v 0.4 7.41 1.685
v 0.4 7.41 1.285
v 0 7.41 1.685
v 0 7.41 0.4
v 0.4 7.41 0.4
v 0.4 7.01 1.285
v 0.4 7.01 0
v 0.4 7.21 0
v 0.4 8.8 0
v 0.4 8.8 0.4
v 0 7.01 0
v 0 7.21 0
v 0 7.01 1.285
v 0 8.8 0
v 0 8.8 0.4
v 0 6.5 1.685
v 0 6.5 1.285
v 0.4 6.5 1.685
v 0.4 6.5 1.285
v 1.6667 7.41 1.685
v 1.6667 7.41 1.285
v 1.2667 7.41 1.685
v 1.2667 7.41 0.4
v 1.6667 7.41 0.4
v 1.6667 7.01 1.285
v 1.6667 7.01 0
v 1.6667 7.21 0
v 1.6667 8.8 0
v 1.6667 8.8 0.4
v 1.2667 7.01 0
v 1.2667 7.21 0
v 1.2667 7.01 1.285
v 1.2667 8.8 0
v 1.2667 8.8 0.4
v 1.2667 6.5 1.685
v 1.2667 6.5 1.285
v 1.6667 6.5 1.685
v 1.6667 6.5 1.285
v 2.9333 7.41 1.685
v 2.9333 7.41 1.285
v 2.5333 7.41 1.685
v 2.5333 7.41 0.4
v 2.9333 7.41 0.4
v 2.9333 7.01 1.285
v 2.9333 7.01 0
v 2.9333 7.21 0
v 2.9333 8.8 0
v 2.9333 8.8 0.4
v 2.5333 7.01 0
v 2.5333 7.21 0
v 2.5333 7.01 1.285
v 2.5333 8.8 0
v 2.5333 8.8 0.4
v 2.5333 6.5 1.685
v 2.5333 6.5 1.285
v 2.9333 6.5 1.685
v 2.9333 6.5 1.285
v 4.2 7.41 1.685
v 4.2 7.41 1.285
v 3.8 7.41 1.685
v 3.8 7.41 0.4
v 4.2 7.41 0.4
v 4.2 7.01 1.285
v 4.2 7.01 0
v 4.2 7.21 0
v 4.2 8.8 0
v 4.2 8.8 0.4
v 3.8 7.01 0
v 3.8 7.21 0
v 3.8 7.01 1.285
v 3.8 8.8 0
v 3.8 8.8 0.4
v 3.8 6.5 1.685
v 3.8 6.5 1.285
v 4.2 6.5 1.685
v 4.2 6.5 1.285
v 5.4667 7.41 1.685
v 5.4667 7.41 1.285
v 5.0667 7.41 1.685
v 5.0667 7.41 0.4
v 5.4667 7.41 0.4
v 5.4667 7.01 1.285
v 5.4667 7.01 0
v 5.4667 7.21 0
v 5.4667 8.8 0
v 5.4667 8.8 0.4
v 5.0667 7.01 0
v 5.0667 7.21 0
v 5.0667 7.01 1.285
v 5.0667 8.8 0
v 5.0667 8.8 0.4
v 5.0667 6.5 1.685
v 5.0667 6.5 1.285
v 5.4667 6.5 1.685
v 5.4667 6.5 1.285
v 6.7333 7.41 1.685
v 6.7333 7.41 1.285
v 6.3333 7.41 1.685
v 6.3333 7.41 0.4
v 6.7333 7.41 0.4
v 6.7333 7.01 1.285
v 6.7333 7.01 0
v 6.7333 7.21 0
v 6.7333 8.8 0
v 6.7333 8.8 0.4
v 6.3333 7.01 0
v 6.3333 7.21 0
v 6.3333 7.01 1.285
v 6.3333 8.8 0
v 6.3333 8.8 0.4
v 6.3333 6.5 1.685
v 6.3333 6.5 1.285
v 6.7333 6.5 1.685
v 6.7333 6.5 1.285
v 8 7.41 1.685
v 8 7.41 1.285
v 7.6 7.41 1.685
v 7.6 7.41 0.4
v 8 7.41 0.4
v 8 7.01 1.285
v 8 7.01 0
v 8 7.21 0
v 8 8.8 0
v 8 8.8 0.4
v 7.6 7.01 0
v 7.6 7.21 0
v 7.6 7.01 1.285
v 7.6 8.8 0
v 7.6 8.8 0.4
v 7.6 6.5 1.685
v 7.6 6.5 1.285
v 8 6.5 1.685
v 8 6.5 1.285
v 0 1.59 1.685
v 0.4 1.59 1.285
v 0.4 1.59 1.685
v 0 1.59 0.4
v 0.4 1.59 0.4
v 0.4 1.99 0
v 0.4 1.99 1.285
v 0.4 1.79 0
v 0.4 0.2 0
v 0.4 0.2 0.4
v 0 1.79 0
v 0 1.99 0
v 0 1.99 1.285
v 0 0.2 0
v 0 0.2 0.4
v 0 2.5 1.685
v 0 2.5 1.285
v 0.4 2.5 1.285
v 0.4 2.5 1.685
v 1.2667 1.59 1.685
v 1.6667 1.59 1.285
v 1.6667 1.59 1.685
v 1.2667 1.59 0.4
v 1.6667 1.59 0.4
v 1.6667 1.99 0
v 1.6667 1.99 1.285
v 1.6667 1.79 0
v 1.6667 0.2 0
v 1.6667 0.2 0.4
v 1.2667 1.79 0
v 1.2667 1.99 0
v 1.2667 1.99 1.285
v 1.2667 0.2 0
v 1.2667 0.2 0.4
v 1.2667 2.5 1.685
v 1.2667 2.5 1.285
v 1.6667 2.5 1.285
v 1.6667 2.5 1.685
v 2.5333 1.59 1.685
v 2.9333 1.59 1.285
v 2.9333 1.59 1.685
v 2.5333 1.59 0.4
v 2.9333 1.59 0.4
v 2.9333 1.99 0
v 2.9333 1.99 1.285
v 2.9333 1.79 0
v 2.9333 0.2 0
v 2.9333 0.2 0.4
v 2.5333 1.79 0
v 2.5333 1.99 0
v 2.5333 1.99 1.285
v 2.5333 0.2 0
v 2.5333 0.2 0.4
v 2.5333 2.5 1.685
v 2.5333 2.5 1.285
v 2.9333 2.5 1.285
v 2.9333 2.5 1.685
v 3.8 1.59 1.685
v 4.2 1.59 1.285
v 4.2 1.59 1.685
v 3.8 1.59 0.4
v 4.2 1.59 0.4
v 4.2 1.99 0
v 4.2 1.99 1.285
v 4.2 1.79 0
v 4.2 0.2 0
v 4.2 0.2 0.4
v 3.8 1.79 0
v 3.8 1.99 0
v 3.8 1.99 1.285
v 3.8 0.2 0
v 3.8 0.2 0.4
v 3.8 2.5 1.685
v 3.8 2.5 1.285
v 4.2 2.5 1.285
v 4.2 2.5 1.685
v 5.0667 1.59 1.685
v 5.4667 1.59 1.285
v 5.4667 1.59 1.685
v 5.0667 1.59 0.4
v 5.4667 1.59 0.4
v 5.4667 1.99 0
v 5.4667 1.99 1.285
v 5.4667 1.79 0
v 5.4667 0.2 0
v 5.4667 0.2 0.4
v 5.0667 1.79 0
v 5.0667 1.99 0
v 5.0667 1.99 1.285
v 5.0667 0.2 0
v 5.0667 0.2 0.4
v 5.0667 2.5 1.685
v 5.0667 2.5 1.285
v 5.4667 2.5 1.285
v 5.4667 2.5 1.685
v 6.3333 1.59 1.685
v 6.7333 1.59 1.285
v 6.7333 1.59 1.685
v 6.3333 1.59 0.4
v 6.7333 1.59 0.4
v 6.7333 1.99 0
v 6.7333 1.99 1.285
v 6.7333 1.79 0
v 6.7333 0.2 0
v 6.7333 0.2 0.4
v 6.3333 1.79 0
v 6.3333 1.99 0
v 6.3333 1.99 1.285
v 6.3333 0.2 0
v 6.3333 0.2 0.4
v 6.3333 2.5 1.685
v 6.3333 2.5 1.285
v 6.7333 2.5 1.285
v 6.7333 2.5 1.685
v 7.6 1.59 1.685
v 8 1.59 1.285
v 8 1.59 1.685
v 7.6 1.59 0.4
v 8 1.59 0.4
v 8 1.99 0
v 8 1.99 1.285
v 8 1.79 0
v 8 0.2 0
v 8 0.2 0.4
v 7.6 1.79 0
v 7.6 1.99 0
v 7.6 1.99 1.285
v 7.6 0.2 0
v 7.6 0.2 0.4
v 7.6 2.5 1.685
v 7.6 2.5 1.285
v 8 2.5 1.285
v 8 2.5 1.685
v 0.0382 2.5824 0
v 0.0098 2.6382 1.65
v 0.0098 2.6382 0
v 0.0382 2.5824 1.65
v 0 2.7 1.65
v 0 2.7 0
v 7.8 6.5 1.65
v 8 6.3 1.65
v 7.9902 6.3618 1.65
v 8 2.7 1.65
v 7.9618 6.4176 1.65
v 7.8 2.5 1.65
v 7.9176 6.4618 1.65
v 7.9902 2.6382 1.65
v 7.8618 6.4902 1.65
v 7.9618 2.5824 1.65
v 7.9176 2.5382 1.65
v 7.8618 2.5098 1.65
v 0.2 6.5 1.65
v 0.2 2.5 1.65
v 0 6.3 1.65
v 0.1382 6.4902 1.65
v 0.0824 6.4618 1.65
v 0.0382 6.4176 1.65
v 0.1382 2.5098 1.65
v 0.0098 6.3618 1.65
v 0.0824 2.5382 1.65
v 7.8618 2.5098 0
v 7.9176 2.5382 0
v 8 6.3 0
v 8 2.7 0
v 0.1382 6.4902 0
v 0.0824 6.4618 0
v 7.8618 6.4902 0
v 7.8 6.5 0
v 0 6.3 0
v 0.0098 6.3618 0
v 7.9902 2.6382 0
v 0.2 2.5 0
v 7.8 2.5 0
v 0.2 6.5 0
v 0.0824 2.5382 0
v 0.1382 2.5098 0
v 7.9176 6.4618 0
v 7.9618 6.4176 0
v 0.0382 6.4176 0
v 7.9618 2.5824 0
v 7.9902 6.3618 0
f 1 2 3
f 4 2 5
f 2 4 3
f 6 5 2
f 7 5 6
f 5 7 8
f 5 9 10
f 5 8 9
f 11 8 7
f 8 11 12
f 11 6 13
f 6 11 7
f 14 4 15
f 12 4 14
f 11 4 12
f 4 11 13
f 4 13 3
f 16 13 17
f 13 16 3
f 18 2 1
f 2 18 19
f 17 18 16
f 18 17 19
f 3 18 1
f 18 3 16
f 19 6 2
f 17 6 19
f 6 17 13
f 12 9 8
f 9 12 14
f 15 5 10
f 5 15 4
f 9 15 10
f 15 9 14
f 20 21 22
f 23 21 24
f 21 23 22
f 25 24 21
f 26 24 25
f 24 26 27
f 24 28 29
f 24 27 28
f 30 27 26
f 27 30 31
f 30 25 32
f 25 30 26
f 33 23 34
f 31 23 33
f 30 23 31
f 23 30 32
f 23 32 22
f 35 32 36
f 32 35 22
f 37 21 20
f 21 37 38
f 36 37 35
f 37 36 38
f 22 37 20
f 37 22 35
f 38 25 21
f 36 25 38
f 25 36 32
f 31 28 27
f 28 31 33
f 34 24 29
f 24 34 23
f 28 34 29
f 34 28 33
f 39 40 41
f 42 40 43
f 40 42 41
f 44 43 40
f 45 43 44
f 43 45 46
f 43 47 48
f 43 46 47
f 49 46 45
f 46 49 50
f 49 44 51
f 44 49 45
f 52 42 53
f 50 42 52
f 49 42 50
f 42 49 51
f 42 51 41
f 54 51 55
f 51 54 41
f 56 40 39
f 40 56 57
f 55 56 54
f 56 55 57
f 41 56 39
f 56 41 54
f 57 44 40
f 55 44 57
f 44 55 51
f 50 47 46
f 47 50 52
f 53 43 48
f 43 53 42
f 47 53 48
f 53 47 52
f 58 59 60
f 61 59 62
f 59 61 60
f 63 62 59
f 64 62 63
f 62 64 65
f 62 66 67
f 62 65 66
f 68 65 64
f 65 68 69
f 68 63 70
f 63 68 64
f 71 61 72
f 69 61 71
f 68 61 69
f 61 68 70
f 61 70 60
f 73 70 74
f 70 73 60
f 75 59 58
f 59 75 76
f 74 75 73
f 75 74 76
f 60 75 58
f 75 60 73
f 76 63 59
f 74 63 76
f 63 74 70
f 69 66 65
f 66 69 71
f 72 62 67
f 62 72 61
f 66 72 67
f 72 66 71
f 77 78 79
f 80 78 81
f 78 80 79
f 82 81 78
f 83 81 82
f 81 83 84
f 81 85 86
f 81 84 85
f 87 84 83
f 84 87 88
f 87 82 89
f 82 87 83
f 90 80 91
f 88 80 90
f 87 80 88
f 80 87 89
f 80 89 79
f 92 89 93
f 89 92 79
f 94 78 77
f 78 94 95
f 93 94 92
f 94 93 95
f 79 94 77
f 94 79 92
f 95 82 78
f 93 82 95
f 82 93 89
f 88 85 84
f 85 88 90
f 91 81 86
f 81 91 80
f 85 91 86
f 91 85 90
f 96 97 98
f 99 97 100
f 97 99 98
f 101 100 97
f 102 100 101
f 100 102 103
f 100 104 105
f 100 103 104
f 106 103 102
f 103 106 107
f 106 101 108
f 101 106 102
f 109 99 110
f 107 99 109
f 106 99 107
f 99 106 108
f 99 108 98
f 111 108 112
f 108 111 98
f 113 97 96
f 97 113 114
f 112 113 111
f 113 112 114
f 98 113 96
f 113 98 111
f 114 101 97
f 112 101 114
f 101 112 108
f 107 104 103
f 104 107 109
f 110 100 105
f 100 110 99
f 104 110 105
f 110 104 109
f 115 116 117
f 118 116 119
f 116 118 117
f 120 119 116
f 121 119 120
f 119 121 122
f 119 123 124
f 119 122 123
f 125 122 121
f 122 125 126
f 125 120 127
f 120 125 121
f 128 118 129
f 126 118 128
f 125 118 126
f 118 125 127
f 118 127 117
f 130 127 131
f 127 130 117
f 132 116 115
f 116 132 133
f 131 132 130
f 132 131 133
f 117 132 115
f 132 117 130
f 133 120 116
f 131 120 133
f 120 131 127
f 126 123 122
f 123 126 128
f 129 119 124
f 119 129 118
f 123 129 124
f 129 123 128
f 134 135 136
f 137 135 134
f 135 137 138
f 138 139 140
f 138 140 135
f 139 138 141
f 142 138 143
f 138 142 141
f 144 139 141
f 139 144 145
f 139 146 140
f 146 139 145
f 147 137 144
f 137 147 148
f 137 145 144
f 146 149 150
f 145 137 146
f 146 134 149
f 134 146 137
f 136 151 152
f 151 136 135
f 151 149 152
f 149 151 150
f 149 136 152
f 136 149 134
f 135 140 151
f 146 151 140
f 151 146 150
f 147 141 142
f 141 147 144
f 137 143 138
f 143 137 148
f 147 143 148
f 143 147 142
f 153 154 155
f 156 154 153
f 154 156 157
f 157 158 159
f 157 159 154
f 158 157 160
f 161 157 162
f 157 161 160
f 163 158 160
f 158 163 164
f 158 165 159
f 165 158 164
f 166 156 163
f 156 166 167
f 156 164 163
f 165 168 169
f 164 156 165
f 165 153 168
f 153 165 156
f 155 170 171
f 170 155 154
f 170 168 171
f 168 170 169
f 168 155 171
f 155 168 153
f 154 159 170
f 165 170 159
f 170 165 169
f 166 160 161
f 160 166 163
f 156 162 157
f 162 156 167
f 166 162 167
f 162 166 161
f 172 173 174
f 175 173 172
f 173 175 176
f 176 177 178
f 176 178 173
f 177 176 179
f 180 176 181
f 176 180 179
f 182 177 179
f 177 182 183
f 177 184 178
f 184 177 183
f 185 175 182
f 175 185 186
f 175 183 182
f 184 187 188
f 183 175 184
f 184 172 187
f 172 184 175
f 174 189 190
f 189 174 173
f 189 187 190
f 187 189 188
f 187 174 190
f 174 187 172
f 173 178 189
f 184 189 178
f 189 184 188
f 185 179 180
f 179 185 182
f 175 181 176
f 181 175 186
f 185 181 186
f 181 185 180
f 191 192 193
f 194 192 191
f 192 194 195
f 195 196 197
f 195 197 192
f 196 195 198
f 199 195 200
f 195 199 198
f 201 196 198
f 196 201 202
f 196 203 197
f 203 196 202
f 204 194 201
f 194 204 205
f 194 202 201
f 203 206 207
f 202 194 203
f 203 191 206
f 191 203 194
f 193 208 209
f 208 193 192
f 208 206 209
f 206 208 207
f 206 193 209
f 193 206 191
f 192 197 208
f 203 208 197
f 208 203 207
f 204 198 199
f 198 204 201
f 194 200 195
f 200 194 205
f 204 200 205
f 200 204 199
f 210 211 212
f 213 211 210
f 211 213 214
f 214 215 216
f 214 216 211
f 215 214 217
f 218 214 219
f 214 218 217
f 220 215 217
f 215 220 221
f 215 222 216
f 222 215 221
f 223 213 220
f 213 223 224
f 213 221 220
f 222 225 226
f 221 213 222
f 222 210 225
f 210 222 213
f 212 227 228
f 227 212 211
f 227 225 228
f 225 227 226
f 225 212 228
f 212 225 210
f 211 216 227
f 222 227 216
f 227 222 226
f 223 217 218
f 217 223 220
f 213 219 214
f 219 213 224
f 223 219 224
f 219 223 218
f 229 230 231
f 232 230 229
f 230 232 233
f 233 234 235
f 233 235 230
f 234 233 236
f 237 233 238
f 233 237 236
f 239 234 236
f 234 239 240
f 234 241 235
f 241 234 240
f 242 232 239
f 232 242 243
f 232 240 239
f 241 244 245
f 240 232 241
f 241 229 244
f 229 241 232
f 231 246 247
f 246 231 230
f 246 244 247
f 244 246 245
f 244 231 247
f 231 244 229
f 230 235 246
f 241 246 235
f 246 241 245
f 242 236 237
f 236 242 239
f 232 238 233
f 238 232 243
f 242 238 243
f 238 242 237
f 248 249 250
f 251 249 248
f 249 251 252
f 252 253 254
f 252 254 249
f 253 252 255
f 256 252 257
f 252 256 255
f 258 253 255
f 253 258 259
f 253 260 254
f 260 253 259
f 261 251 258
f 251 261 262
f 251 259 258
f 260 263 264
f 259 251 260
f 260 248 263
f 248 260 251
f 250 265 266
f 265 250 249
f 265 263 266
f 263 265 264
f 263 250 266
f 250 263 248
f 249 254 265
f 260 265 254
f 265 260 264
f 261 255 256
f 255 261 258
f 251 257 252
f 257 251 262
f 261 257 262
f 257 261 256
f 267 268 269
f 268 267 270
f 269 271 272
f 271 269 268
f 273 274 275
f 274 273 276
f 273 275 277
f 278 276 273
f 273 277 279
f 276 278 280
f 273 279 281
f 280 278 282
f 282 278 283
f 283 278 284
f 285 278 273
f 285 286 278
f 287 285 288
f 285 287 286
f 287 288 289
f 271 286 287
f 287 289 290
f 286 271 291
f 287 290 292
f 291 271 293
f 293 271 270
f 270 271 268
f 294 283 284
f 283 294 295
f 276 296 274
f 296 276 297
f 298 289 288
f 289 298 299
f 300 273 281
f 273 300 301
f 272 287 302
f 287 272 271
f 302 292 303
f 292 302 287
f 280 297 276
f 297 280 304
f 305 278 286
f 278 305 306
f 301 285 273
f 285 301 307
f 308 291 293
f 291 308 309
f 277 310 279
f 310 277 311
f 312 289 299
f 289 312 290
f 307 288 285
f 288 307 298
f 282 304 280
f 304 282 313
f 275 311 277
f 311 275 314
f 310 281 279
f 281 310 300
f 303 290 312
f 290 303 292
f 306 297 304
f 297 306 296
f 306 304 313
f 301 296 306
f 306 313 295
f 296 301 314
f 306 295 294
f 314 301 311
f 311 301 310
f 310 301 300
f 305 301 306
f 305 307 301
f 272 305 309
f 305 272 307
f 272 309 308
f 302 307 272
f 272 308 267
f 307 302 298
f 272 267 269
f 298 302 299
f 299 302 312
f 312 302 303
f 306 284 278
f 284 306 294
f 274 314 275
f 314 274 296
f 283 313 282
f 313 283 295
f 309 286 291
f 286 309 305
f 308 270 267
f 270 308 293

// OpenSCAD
/**
 * Module: Placeholder for SMD chip (Surface Mount Device chip).
 *
 * An SMD chip is
 * an electronic component that is mounted directly onto the surface of a
 * printed circuit board (PC
 *
 * Author: Karim Aziiev <karim.aziiev@gmail.com>
 * License: GPL-3.0-or-later
 */

include <../parameters.scad>
include <../colors.scad>

use <../l_bracket.scad>
use <pins.scad>
use <../lib/shapes2d.scad>
use <../lib/transforms.scad>

module smd_chip_2d(length,
                   w,
                   r=0.2,
                   fn=20,
                   center=false) {
  rounded_rect([length, w],
               center=center,
               fn=fn,
               r=r);
}

module smd_chip_slot_2d(length,
                        total_w,
                        r=0.2,
                        fn=20,
                        center=false) {
  rounded_rect([length, total_w],
               center=center,
               fn=fn,
               r=r);
}

module smd_chip(length,
                total_w,
                w,
                h,
                r=0.2,
                fn=20,
                smd_color=black_1,
                j_lead_n,
                j_lead_thickness=0.5,
                j_lead_color=metallic_yellow_silver,
                center=true) {

  let (thickness = j_lead_thickness,
       amount = j_lead_n,

       available_w = (total_w - w) / 2 - (thickness * 2),
       upper_len = available_w * 0.3,
       lower_len = available_w * 0.7,
       base_h = h * 0.9,
       full_len = j_lead_full_len(lower_len=lower_len,
                                  upper_len=upper_len,
                                  thickness=thickness),
       pitch = pin_pitch_edge_aligned(total_len=length,
                                      pin_w=thickness,
                                      count=amount),
       y = w / 2 - full_len / 2 + full_len) {

    translate([center ? 0 : length / 2, center ? 0 : total_w / 2, 0]) {

      union() {
        color(smd_color, alpha=1) {
          linear_extrude(height=h,
                         center=false) {
            smd_chip_2d(length=length,
                        w=w,
                        r=r,
                        fn=fn,
                        center=true);
          }
        }

        if (!is_undef(j_lead_n) && j_lead_n > 0) {
          mirror_copy([0, 1, 0]) {
            translate([0, y, 0]) {
              color(j_lead_color, alpha=1) {
                j_leads_centered(base_h=base_h,
                                 lower_len=lower_len,
                                 upper_len=upper_len,
                                 count=amount,
                                 thickness=thickness,
                                 pitch=pitch);
              }
            }
          }
        }
      }
    }
  }
}

smd_chip(length=ultrasonic_smd_len,
         w=ultrasonic_smd_chip_w,
         j_lead_n=ultrasonic_smd_led_count,
         j_lead_thickness=ultrasonic_smd_led_thickness,
         total_w=9,
         h=ultrasonic_smd_h,
         center=false);
